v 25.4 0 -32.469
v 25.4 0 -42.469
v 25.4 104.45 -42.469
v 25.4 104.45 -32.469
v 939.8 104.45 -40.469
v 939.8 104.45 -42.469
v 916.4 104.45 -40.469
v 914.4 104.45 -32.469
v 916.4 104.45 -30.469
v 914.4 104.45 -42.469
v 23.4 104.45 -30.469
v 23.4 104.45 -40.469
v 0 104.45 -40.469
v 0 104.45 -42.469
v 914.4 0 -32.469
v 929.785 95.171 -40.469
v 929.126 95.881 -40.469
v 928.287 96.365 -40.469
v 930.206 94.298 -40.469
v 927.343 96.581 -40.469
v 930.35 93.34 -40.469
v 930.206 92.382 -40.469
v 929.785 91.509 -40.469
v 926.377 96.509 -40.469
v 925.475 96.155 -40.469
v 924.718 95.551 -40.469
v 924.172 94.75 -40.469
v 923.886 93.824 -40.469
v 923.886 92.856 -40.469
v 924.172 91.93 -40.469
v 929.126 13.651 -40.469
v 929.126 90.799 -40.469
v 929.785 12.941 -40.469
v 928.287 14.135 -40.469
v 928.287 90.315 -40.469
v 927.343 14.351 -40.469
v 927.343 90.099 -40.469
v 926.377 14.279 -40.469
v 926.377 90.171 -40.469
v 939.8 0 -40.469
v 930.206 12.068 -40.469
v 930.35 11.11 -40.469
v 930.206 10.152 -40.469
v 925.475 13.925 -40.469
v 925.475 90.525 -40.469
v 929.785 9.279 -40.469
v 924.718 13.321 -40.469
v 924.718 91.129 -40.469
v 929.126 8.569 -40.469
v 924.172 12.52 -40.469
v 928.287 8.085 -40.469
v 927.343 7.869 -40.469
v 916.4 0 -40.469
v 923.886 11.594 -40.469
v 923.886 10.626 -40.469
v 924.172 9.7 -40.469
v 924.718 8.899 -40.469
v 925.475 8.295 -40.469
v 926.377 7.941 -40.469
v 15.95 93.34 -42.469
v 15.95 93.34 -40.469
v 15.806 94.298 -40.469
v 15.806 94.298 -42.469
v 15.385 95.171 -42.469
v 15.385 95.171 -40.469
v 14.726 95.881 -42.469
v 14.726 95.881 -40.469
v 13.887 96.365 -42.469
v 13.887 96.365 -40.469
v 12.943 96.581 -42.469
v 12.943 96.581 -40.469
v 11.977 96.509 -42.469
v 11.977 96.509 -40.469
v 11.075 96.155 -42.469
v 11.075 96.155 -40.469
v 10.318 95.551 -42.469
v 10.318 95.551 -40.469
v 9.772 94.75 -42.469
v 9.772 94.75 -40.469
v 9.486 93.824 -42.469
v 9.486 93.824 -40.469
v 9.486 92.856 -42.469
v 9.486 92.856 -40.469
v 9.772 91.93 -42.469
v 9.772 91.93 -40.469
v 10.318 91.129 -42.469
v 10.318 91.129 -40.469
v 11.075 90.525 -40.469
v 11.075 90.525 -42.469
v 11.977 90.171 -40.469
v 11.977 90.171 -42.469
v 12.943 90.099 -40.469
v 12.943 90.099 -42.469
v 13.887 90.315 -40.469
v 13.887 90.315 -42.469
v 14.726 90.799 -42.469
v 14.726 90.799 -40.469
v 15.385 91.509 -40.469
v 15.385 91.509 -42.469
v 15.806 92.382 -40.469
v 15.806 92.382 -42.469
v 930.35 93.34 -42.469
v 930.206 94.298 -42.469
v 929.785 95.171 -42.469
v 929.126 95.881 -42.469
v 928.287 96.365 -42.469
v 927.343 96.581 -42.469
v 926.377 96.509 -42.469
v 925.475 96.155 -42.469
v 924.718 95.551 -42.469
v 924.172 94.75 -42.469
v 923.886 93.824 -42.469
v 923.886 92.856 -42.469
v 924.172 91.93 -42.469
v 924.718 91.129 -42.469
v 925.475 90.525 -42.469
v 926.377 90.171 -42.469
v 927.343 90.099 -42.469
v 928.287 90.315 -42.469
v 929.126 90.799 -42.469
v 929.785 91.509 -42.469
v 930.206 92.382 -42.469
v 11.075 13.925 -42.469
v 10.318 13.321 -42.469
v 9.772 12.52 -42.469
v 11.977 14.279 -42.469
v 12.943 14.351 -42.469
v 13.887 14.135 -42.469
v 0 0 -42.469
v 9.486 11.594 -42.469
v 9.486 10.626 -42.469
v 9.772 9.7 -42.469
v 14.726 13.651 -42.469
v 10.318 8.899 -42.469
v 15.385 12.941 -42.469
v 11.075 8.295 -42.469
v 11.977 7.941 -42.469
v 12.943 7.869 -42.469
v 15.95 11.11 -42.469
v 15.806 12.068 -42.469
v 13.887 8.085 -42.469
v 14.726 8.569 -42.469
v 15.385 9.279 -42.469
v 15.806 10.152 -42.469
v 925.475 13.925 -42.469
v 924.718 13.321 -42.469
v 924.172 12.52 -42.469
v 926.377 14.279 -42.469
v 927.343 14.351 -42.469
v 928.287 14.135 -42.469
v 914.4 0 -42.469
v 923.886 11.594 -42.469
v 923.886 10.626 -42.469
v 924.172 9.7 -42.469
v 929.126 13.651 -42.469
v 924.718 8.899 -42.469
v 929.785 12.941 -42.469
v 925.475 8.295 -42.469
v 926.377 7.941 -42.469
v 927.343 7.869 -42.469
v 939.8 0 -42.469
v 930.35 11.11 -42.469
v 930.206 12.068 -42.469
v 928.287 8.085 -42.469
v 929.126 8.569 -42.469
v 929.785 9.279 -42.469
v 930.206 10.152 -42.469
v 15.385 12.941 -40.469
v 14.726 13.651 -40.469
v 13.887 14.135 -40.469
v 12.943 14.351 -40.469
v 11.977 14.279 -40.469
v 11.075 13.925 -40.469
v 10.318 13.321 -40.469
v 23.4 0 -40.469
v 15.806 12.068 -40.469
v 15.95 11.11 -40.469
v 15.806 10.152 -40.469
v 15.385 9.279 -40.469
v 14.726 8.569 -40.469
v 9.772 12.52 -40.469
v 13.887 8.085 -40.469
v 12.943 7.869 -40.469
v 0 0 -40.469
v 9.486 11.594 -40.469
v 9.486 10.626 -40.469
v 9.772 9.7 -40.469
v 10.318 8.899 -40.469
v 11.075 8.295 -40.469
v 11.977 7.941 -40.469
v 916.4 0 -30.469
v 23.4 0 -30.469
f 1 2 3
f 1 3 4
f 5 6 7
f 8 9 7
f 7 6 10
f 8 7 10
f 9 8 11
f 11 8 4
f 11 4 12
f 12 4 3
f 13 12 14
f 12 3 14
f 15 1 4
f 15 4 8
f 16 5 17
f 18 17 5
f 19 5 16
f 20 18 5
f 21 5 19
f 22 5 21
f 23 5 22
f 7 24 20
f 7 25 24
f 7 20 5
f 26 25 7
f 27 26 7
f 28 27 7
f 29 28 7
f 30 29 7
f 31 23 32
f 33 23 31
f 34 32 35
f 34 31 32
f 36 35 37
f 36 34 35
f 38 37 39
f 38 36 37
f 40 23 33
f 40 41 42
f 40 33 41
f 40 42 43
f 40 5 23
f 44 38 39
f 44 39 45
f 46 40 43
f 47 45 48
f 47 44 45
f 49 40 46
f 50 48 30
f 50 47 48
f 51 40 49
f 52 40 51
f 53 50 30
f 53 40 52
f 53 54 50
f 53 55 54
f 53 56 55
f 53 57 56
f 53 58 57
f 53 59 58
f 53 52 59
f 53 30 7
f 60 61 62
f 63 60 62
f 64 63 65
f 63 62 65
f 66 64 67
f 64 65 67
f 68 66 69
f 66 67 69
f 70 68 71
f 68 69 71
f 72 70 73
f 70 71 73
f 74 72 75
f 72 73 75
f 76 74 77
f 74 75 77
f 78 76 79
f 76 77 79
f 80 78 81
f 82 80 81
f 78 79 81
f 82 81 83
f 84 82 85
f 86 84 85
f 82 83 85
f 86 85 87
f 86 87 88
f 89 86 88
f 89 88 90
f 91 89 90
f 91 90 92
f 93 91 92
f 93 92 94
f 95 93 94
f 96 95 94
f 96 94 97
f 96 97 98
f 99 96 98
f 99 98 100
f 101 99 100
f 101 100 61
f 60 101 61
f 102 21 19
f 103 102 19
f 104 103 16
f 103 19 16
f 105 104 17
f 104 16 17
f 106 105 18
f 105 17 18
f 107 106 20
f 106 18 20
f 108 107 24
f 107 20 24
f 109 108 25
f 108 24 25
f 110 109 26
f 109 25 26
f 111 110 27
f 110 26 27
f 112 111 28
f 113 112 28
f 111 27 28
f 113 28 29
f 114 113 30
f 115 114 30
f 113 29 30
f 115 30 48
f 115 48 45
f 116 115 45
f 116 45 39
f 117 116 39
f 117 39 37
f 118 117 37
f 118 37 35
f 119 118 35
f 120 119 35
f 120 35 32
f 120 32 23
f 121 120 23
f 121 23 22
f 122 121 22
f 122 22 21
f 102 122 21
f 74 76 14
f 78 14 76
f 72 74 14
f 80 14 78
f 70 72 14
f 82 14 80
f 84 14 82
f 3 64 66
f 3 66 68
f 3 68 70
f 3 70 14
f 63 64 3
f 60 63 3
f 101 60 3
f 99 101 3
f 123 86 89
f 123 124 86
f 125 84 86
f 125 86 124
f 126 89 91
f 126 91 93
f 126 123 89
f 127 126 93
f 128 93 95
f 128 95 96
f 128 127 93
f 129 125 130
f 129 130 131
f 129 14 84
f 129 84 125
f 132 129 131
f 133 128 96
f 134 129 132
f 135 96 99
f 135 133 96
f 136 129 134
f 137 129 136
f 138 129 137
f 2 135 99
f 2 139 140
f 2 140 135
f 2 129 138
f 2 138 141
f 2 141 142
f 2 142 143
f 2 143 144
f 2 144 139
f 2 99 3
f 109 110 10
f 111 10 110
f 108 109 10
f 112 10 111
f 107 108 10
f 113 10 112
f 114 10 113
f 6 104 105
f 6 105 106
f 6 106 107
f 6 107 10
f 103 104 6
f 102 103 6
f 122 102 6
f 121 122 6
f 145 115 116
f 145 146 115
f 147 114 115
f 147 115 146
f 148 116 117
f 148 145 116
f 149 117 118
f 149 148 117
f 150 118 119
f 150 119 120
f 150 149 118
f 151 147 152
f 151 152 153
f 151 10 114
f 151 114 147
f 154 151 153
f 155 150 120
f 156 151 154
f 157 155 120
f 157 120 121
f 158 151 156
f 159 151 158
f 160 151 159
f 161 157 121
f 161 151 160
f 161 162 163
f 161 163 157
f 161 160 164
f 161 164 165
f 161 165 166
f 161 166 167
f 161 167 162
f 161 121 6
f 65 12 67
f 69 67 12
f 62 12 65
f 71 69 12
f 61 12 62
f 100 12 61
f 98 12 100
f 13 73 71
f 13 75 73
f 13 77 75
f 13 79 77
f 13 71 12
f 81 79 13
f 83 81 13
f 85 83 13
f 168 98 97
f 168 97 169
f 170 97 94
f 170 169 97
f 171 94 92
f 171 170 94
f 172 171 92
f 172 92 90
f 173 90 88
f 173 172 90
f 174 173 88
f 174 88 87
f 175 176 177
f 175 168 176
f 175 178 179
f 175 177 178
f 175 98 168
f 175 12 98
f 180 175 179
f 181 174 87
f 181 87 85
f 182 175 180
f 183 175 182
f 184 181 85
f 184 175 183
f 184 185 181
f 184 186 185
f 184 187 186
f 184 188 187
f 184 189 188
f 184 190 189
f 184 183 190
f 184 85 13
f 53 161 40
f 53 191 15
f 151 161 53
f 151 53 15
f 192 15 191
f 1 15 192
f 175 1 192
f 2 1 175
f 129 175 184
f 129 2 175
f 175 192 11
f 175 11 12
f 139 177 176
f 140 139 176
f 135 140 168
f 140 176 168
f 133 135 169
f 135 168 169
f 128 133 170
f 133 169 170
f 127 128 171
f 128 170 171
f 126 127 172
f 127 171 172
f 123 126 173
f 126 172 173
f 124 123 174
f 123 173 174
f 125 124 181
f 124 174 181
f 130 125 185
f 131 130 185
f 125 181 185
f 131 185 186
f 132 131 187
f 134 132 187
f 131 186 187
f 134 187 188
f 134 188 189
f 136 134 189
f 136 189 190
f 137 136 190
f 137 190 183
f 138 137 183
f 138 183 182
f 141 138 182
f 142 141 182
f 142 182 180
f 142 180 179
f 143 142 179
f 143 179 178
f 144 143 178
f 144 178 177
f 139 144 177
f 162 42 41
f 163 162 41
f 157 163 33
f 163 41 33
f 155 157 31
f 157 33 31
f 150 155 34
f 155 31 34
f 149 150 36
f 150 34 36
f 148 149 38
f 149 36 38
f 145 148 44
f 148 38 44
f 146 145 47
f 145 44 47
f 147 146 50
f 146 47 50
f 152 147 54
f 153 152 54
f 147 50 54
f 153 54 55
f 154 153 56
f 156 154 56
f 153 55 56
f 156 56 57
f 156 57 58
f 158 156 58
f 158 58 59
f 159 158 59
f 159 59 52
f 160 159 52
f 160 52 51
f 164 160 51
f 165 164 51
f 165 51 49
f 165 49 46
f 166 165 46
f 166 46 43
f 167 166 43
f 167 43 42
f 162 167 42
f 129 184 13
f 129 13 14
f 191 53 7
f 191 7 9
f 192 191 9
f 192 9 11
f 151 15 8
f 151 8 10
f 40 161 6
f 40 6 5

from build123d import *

# Parameters (mm, degrees)
BOSS_EXTRUDE1_DEPTH = 104.45
SKETCH2_R           = 3.25
CUT_EXTRUDE1_DEPTH  = 946.639382904


with BuildPart() as part:
    # Sketch1 → Boss-Extrude1 (new body)
    with BuildSketch(Plane(origin=(0, 0, 0), x_dir=(1, 0, 0), z_dir=(0, 1, 0))):
        Polygon((916.4, 30.468956062), (23.4, 30.468956062), (23.4, 40.468956062), (0, 40.468956062), (0, 42.468956062), (25.4, 42.468956062), (25.4, 32.468956062), (914.4, 32.468956062), (914.4, 42.468956062), (939.8, 42.468956062), (939.8, 40.468956062), (916.4, 40.468956062), align=None)
    extrude(amount=BOSS_EXTRUDE1_DEPTH)

    # Sketch2 → Cut-Extrude1 (cut, through all)
    with BuildSketch(Plane.XY.offset(-40.468956062)):
        with Locations((927.1, 11.11)):
            Circle(SKETCH2_R)
        with Locations((927.1, 93.34)):
            Circle(SKETCH2_R)
        with Locations((12.7, 11.11)):
            Circle(SKETCH2_R)
        with Locations((12.7, 93.34)):
            Circle(SKETCH2_R)
    extrude(amount=-CUT_EXTRUDE1_DEPTH, mode=Mode.SUBTRACT)


solid = part.part
